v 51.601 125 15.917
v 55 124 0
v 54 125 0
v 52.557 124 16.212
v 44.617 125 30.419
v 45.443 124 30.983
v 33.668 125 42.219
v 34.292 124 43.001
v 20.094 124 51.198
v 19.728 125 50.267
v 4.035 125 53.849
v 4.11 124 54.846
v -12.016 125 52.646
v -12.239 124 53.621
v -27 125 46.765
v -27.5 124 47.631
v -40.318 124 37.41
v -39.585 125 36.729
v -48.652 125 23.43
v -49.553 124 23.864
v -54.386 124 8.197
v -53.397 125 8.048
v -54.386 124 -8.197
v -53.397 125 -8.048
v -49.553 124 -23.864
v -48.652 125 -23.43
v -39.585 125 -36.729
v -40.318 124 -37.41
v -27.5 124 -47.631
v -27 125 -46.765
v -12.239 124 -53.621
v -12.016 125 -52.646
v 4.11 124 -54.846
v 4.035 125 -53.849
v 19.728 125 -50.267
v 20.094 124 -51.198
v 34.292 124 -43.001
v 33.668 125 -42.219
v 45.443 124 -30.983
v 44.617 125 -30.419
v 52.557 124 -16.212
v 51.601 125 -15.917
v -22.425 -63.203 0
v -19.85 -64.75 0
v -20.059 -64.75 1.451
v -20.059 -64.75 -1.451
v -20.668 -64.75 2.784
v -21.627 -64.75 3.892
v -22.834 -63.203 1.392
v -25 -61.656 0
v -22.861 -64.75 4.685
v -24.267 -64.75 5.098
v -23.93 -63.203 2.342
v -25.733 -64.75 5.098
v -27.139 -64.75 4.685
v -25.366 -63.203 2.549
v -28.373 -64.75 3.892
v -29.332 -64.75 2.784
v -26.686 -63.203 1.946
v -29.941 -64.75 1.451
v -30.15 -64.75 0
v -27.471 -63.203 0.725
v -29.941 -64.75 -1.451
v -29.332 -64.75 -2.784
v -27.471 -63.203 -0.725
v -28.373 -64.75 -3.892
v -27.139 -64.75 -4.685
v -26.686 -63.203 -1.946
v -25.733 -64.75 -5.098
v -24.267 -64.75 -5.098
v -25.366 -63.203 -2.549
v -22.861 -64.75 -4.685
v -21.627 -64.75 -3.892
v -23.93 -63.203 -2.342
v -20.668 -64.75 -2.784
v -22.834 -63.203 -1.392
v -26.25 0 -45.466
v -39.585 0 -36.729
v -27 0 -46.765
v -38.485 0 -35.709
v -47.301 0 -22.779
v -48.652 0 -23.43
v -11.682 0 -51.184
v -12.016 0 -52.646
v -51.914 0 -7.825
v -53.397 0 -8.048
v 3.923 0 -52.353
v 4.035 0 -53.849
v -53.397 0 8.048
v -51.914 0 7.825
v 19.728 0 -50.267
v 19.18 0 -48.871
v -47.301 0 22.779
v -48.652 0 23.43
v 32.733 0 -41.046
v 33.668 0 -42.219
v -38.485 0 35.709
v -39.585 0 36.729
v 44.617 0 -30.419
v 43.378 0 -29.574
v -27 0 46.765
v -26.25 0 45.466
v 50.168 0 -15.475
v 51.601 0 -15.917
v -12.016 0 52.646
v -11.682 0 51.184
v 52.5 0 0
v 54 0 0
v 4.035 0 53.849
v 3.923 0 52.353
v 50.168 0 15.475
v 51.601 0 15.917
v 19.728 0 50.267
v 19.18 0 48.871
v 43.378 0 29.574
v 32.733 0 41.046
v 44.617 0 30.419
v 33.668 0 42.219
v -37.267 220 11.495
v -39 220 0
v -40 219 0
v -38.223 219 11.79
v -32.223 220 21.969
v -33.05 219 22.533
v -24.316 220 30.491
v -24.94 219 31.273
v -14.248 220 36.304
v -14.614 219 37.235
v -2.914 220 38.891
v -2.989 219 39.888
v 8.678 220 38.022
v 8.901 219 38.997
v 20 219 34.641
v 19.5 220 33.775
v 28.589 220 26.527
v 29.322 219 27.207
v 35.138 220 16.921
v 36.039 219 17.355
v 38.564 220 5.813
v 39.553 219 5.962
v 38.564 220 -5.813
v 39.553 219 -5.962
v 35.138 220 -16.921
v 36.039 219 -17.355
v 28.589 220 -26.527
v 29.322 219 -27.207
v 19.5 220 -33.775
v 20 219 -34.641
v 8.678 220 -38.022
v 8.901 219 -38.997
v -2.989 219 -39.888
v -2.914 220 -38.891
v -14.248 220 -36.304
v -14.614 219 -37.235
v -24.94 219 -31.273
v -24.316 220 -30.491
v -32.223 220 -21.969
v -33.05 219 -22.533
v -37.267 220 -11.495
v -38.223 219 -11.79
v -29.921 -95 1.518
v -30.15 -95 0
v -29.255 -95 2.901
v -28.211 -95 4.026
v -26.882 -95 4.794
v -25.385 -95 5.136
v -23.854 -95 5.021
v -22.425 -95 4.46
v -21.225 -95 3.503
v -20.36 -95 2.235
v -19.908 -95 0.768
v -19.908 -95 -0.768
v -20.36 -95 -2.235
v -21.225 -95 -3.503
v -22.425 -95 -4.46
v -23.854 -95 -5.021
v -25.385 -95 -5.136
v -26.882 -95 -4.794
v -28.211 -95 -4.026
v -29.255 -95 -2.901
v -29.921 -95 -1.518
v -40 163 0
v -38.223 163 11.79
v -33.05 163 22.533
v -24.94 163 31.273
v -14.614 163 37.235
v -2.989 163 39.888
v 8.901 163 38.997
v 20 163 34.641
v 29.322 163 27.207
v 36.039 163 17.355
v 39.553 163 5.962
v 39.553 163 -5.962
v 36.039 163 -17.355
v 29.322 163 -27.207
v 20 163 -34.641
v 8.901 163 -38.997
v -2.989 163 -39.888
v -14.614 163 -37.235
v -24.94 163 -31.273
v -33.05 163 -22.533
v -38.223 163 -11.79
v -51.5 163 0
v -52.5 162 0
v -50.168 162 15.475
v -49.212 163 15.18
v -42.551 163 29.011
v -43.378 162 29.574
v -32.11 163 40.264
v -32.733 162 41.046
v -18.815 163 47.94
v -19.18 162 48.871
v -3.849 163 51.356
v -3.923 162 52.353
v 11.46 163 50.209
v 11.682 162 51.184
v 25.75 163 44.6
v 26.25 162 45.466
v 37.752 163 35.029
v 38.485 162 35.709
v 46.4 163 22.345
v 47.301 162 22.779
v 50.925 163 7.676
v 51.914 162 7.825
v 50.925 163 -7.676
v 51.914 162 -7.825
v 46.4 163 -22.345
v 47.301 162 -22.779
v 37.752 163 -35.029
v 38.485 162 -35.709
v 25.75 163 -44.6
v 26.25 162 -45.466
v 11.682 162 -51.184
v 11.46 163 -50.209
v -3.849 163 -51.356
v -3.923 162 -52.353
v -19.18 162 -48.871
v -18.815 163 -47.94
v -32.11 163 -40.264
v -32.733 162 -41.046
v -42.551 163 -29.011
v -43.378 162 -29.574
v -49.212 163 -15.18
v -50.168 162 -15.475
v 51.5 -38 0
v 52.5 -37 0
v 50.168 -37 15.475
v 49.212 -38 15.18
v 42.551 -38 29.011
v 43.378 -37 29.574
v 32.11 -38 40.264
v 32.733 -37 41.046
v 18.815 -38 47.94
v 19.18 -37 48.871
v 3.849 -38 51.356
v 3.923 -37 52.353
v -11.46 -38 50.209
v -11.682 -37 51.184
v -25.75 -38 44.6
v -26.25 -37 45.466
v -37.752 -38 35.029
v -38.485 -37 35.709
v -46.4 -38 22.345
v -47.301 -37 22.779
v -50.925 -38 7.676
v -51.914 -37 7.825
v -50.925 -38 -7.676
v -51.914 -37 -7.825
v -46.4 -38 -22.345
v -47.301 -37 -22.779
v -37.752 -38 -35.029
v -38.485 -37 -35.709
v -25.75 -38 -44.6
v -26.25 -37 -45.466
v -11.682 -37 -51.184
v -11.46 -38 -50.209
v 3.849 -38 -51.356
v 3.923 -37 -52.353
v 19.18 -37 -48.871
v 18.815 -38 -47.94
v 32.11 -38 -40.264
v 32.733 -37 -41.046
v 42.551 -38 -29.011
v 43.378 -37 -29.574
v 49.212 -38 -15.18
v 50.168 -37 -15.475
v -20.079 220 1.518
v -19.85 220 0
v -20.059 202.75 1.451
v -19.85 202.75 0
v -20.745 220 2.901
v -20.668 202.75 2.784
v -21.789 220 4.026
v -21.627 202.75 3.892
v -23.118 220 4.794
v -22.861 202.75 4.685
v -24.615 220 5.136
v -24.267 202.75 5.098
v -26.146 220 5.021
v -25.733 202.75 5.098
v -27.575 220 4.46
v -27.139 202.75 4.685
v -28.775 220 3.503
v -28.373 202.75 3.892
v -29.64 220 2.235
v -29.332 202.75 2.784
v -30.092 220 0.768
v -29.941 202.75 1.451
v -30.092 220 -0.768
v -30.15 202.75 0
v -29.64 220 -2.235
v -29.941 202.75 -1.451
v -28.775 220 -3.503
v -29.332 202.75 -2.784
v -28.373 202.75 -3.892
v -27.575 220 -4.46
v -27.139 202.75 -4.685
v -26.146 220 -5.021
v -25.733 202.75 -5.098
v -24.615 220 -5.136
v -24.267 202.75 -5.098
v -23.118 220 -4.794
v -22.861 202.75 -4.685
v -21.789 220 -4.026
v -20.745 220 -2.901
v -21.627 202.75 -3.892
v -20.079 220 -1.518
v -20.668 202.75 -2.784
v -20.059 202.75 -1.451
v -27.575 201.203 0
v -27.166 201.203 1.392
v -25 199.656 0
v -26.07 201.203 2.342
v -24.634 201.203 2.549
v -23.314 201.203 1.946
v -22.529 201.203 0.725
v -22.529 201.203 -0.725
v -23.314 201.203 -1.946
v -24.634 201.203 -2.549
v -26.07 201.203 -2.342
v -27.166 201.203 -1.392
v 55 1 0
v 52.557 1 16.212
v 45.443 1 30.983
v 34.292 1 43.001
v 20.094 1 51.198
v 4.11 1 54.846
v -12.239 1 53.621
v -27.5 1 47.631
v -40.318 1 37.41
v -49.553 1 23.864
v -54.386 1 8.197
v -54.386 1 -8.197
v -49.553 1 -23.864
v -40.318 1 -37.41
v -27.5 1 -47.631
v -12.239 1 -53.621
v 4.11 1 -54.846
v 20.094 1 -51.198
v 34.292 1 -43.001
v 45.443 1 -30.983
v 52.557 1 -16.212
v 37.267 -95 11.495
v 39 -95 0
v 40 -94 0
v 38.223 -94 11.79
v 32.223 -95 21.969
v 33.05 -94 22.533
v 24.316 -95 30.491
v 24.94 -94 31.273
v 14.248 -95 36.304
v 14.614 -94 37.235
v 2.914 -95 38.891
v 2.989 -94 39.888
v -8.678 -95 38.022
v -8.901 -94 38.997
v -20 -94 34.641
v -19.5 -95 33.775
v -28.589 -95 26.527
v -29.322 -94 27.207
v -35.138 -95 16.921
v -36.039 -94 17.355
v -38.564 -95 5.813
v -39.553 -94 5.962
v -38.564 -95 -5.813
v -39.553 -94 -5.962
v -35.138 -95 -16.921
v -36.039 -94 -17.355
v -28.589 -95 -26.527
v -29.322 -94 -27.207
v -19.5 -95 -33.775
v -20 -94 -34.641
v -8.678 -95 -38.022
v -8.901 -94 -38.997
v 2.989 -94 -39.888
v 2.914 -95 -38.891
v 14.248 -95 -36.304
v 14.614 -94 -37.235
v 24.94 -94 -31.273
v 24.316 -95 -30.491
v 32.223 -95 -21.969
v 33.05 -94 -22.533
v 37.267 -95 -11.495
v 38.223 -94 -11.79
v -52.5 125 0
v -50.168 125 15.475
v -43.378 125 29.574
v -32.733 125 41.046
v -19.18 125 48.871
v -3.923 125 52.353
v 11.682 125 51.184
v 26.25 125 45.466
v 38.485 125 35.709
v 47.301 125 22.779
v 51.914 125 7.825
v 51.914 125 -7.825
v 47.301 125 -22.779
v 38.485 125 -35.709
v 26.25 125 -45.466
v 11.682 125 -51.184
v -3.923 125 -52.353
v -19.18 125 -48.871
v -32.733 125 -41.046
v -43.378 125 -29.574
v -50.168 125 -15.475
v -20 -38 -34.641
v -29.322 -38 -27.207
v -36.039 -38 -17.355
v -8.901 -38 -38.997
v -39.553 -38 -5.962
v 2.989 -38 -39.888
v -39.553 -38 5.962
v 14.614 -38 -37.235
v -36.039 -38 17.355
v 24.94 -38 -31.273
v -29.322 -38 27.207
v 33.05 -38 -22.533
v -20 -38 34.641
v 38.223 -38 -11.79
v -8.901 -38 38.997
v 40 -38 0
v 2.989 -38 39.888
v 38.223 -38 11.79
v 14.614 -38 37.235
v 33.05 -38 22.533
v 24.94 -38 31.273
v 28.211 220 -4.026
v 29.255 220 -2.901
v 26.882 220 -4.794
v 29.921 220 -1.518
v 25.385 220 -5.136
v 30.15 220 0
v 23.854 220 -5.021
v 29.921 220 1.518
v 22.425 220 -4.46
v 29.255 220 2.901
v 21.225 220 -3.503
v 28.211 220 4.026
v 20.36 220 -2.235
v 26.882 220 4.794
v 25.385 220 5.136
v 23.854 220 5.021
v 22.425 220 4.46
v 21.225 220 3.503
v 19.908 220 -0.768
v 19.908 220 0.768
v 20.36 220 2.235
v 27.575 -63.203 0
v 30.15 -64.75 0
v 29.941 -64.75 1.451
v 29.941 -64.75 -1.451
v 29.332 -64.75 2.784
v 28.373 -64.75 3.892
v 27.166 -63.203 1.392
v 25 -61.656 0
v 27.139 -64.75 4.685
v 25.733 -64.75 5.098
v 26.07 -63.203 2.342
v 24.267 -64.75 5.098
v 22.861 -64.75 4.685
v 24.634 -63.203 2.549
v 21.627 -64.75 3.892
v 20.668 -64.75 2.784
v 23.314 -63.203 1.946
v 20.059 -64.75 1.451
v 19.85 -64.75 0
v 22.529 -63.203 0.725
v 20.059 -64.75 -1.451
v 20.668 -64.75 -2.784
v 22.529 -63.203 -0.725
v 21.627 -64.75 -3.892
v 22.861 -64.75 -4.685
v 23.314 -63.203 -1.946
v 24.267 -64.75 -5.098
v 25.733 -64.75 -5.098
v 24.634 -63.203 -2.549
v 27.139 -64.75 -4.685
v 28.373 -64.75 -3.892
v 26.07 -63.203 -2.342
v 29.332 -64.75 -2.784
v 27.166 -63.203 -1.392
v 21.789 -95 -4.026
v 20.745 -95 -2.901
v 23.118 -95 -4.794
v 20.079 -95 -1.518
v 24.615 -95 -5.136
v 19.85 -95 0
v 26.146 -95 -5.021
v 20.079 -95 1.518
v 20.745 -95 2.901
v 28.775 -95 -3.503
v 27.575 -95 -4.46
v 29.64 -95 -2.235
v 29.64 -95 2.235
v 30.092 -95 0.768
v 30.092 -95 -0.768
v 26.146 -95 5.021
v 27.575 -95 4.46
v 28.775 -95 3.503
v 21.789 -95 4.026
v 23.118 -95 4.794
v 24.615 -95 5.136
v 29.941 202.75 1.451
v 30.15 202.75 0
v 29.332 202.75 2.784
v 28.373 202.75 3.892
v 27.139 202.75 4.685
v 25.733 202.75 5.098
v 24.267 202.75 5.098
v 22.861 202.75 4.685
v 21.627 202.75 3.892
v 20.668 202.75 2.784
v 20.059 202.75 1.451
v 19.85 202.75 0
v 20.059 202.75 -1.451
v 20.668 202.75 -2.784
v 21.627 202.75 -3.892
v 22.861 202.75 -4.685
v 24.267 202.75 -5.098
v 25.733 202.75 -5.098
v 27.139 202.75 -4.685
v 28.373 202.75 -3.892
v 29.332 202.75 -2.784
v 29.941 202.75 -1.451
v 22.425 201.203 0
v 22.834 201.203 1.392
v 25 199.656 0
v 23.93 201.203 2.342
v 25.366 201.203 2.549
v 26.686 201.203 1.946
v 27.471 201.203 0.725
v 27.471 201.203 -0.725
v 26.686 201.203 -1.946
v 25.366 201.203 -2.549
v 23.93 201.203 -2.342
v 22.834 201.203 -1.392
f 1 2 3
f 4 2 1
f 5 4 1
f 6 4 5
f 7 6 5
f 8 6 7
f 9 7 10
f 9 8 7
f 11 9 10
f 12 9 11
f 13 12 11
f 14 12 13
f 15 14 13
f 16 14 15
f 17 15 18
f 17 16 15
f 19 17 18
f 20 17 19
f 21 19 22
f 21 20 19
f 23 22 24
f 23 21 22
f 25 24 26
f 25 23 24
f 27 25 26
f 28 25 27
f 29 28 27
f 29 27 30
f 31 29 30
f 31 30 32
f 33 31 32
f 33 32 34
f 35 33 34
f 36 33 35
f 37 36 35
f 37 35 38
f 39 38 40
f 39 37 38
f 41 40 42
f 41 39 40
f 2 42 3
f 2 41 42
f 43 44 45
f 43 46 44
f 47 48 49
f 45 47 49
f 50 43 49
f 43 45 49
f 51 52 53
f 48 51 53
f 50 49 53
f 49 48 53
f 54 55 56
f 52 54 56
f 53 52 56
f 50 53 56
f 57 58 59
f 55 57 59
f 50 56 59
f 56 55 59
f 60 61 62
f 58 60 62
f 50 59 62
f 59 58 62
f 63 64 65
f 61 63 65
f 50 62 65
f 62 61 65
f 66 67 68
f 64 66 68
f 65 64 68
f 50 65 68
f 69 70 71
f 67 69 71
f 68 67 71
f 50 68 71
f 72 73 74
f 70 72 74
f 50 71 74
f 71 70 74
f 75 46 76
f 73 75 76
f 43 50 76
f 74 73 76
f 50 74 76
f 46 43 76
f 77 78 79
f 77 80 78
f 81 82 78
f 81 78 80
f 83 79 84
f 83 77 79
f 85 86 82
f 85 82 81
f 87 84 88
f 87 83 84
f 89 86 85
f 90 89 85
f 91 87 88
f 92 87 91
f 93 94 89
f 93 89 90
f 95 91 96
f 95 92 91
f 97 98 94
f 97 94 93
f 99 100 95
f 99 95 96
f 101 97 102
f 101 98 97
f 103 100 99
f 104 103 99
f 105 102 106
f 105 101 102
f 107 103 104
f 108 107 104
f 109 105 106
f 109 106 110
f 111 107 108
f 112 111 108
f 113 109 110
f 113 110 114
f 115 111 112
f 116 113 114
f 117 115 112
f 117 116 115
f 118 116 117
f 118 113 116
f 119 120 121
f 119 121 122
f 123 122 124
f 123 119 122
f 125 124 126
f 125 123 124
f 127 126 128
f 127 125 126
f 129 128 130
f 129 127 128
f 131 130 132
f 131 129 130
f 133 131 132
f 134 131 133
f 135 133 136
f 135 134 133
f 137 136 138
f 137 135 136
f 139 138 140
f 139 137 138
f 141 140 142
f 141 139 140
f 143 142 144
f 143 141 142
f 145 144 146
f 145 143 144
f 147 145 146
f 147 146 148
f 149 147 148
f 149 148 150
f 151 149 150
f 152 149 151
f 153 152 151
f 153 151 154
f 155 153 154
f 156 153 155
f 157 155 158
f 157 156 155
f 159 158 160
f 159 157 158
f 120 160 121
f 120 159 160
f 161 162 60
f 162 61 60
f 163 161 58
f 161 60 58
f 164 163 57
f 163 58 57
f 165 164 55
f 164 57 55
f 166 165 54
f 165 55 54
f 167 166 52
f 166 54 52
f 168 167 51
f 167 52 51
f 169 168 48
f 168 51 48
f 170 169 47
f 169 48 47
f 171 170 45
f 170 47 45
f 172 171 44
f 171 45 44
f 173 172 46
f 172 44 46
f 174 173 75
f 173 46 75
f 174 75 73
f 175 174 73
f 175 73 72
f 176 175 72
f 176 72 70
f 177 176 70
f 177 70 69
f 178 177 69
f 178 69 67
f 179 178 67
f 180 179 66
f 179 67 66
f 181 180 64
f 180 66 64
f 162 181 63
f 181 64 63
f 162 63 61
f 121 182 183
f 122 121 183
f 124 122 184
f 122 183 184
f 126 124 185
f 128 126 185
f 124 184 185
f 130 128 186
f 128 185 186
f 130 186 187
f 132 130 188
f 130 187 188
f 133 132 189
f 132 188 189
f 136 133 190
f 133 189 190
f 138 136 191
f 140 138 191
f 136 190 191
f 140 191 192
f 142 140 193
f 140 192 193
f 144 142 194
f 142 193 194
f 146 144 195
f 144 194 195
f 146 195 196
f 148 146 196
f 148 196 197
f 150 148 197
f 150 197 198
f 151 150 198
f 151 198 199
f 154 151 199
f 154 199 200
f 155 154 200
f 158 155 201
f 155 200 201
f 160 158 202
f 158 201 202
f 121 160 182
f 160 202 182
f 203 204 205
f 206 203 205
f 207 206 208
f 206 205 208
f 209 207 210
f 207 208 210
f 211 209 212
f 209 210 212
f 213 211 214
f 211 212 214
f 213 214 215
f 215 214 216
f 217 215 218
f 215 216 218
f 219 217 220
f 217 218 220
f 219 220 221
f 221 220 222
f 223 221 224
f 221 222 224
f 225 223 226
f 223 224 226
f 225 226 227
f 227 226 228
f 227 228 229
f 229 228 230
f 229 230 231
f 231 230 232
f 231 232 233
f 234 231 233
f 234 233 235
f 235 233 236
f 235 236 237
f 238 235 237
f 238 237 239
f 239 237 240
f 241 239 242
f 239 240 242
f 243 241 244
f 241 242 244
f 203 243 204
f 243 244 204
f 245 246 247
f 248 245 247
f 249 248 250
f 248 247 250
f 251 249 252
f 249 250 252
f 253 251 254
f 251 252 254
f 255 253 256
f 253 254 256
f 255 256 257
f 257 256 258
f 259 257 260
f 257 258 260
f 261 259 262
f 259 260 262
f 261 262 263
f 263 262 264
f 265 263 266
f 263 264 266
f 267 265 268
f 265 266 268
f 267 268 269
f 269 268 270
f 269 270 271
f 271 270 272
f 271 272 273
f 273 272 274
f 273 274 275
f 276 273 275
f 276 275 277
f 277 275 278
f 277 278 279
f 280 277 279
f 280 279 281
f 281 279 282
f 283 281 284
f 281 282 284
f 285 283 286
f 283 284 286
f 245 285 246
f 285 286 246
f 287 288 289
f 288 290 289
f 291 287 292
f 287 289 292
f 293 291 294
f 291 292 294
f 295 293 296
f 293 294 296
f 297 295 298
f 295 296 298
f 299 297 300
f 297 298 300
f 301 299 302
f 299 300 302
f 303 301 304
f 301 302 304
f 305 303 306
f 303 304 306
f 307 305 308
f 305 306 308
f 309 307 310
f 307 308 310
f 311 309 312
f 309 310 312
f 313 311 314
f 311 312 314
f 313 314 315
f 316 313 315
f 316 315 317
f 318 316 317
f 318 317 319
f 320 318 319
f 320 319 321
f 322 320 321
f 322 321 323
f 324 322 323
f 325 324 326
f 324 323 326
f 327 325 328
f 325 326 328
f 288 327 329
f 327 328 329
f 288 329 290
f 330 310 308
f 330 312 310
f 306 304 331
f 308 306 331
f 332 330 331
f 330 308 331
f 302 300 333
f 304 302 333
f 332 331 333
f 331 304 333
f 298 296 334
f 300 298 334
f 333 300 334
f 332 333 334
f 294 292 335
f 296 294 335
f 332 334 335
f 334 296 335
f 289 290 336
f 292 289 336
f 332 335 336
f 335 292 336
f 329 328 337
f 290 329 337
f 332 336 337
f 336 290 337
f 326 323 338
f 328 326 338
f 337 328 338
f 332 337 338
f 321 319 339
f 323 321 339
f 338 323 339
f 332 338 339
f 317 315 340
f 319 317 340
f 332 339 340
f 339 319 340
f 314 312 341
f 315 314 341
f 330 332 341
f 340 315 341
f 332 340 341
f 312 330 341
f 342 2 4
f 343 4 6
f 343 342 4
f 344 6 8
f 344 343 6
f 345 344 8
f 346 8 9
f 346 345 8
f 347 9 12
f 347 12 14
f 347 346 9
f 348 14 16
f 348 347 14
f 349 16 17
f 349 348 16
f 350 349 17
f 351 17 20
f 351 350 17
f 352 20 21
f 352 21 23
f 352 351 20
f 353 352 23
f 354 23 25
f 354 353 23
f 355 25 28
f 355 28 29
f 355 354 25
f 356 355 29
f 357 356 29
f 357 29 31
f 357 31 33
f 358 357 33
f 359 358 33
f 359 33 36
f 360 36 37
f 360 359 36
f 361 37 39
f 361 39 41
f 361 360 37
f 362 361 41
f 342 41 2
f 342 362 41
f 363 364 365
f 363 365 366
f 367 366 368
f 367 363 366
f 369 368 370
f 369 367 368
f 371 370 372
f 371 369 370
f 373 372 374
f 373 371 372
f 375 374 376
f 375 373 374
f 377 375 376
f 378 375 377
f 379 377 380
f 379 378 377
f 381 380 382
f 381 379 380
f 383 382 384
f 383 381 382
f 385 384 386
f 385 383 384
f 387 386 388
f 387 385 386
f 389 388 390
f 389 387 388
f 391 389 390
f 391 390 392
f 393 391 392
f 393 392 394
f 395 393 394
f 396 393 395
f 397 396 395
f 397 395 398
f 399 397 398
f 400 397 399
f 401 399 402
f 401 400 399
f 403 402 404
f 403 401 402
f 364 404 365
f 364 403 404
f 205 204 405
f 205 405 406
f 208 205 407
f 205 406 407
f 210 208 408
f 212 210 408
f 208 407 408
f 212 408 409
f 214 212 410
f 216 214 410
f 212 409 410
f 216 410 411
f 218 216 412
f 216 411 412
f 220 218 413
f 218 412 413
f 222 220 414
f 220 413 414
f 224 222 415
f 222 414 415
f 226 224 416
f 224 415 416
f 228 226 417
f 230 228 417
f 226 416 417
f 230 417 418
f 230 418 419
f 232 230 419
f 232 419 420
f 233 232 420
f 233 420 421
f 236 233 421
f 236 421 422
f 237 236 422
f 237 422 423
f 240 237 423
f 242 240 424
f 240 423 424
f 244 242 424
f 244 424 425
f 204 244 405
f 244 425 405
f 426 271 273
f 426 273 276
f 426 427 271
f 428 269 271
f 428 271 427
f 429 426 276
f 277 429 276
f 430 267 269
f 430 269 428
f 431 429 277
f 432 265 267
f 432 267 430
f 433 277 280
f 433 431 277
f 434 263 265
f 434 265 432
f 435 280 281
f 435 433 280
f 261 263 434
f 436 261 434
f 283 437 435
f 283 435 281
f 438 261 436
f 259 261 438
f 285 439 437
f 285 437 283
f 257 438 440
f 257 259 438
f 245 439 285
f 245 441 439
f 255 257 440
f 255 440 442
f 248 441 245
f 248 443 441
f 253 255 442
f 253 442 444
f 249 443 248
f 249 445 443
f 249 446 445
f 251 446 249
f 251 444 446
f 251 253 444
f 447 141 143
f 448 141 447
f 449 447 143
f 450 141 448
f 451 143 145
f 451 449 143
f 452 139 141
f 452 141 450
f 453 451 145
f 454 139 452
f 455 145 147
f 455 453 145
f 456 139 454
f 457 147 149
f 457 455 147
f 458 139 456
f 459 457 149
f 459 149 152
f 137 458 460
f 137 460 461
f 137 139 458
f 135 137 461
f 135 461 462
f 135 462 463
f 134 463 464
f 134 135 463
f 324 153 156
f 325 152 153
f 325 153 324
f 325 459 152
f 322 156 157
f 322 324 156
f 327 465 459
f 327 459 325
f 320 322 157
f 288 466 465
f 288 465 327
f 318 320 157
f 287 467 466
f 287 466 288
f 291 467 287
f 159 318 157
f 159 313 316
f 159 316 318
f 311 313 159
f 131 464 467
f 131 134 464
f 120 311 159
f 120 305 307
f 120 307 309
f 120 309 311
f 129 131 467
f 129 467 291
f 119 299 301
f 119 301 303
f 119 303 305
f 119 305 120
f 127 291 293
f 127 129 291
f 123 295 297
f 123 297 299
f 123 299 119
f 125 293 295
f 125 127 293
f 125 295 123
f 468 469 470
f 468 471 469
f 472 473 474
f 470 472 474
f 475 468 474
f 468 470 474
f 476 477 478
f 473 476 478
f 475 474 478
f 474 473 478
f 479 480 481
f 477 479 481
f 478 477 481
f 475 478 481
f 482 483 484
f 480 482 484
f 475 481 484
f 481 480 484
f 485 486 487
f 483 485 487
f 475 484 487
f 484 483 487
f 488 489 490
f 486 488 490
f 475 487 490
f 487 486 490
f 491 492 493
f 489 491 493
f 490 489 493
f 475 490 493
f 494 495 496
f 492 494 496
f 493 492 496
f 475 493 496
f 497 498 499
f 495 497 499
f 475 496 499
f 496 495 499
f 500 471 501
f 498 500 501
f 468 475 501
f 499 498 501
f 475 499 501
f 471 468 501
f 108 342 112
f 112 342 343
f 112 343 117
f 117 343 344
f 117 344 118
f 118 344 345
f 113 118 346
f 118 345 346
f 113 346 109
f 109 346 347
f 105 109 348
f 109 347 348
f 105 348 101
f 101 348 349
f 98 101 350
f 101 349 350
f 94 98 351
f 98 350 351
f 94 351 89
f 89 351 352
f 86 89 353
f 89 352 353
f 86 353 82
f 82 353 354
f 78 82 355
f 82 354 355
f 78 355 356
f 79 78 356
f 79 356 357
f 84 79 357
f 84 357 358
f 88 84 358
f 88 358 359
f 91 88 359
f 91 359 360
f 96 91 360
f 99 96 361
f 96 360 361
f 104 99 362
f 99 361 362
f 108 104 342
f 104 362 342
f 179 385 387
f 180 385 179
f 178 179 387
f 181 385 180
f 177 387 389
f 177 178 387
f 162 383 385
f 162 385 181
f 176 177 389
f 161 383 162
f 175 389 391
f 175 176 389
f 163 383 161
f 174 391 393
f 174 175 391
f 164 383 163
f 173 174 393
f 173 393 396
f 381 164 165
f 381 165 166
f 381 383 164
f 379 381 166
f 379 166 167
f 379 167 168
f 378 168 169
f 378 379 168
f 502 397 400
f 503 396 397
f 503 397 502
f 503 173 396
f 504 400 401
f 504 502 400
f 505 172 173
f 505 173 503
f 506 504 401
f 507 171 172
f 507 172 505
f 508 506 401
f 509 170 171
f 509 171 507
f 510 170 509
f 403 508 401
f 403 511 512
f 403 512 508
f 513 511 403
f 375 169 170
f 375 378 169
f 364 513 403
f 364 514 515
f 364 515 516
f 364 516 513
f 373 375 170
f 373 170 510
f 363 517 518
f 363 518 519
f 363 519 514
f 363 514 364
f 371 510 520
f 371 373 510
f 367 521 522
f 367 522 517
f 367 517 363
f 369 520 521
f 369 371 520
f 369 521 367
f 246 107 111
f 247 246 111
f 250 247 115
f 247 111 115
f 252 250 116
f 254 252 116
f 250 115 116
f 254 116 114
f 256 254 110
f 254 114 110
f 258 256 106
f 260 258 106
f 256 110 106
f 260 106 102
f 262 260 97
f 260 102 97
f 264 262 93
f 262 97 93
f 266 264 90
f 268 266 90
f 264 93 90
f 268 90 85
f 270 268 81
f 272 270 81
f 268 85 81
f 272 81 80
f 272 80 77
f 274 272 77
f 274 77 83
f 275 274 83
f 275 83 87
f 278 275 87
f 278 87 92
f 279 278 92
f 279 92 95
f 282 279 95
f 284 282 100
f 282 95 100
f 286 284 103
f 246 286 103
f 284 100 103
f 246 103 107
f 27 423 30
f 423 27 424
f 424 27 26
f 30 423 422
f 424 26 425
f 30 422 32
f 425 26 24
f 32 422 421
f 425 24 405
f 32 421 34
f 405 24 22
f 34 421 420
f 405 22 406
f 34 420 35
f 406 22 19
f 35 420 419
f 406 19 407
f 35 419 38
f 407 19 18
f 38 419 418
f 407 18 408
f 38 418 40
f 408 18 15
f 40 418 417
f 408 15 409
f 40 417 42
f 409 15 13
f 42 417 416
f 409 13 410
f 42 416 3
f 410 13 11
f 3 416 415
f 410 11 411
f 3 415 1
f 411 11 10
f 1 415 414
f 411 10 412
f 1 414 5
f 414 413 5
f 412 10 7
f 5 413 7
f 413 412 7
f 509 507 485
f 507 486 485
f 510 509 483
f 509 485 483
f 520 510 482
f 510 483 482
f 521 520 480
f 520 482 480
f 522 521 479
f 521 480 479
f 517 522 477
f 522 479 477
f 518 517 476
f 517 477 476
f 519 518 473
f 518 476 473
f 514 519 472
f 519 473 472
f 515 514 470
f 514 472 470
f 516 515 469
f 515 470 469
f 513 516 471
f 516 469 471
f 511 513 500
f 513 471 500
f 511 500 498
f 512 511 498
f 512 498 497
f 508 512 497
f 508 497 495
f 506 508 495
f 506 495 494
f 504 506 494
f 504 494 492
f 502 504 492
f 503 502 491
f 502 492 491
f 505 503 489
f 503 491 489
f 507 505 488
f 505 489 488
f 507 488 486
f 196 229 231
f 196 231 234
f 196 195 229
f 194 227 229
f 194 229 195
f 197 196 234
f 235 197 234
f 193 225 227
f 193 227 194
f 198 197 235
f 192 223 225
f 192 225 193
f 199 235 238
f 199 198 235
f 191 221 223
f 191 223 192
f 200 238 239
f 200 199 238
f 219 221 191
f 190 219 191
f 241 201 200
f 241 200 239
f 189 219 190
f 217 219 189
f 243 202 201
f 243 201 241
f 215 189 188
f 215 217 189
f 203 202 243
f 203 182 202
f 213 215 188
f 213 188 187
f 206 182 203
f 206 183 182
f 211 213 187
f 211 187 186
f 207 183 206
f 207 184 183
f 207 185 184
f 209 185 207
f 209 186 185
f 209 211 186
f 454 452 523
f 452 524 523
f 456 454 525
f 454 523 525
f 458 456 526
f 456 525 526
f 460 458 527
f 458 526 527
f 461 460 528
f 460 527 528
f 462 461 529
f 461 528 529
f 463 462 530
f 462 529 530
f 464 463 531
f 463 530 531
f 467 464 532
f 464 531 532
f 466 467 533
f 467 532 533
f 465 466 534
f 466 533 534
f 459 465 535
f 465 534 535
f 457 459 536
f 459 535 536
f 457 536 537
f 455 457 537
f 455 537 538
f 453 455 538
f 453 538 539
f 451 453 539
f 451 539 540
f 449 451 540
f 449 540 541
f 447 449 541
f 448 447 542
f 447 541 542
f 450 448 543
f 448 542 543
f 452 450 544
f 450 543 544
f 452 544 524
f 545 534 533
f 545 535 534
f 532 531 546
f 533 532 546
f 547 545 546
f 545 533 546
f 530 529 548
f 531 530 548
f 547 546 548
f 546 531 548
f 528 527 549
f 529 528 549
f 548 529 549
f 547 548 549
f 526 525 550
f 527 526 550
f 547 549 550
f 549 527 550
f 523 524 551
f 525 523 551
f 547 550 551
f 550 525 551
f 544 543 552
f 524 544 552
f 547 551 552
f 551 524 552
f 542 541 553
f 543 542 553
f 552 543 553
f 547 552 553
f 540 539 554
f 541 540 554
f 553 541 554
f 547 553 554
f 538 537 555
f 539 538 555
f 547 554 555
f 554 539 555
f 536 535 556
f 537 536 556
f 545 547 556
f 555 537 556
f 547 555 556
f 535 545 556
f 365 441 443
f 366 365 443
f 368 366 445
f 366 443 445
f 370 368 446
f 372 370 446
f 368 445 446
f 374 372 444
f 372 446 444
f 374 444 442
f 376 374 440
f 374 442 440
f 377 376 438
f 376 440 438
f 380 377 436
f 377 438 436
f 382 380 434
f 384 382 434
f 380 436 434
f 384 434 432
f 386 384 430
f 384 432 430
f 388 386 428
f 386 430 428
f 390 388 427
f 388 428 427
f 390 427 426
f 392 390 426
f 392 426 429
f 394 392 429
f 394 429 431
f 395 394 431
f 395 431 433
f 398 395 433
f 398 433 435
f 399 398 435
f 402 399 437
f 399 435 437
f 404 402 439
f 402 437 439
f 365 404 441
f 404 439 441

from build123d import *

# Parameters (mm, degrees)
F0_R      = 55
F1_DEPTH  = 125
F2_R      = 52.5
F3_DEPTH  = 38
F4_R      = 40
F5_DEPTH  = 57
F6_R      = 52.5
F7_DEPTH  = 38
F8_R      = 40
F9_DEPTH  = 57
F10_SIZE  = 1
F11_SIZE  = 1
F12_SIZE  = 1
F13_SIZE  = 1
F14_SIZE  = 1
F15_SIZE  = 1
F17_D     = 10.3
F17_DEPTH = 30.25
F17_TIP   = 3.094432188
F19_D     = 10.3
F19_DEPTH = 17.25
F19_TIP   = 3.094432188


with BuildPart() as f1:
    # F0 (on Front) → F1 (new body)
    with BuildSketch(Plane.XZ):
        Circle(F0_R)
    extrude(amount=-F1_DEPTH)

    # F2 (on face) → F3 (join)
    with BuildSketch(Plane.XZ):
        Circle(F2_R)
    extrude(amount=F3_DEPTH)

    # F4 (on face) → F5 (join)
    with BuildSketch(Plane.XZ.offset(38)):
        Circle(F4_R)
    extrude(amount=F5_DEPTH)

    # F6 (on face) → F7 (join)
    with BuildSketch(Plane(origin=(0, 125, 0), x_dir=(-1, 0, 0), z_dir=(0, 1, 0))):
        Circle(F6_R)
    extrude(amount=F7_DEPTH)

    # F8 (on face) → F9 (join)
    with BuildSketch(Plane(origin=(0, 163, 0), x_dir=(-1, 0, 0), z_dir=(0, 1, 0))):
        Circle(F8_R)
    extrude(amount=F9_DEPTH)

    # F10
    f10_edges = [f1.edges().sort_by_distance(p)[0] for p in [
        (-40, -95, 0),
    ]]
    chamfer(f10_edges, length=F10_SIZE)

    # F11
    f11_edges = [f1.edges().sort_by_distance(p)[0] for p in [
        (-52.5, -38, 0),
    ]]
    chamfer(f11_edges, length=F11_SIZE)

    # F12
    f12_edges = [f1.edges().sort_by_distance(p)[0] for p in [
        (-55, 0, 0),
    ]]
    chamfer(f12_edges, length=F12_SIZE)

    # F13
    f13_edges = [f1.edges().sort_by_distance(p)[0] for p in [
        (40, 220, 0),
    ]]
    chamfer(f13_edges, length=F13_SIZE)

    # F14
    f14_edges = [f1.edges().sort_by_distance(p)[0] for p in [
        (52.5, 163, 0),
    ]]
    chamfer(f14_edges, length=F14_SIZE)

    # F15
    f15_edges = [f1.edges().sort_by_distance(p)[0] for p in [
        (-55, 125, 0),
    ]]
    chamfer(f15_edges, length=F15_SIZE)

    # F17
    with Locations(Plane.XZ.offset(95)):
        with Locations((-25, 0), (25, 0)):
            Hole(F17_D / 2, depth=F17_DEPTH)
            with Locations((0, 0, -(F17_DEPTH + F17_TIP / 2))):  # 118° drill point
                Cone(0, F17_D / 2, F17_TIP, mode=Mode.SUBTRACT)

    # F19
    with Locations(Plane(origin=(0, 220, 0), x_dir=(-1, 0, 0), z_dir=(0, 1, 0))):
        with Locations((-25, 0), (25, 0)):
            Hole(F19_D / 2, depth=F19_DEPTH)
            with Locations((0, 0, -(F19_DEPTH + F19_TIP / 2))):  # 118° drill point
                Cone(0, F19_D / 2, F19_TIP, mode=Mode.SUBTRACT)


solid = f1.part
